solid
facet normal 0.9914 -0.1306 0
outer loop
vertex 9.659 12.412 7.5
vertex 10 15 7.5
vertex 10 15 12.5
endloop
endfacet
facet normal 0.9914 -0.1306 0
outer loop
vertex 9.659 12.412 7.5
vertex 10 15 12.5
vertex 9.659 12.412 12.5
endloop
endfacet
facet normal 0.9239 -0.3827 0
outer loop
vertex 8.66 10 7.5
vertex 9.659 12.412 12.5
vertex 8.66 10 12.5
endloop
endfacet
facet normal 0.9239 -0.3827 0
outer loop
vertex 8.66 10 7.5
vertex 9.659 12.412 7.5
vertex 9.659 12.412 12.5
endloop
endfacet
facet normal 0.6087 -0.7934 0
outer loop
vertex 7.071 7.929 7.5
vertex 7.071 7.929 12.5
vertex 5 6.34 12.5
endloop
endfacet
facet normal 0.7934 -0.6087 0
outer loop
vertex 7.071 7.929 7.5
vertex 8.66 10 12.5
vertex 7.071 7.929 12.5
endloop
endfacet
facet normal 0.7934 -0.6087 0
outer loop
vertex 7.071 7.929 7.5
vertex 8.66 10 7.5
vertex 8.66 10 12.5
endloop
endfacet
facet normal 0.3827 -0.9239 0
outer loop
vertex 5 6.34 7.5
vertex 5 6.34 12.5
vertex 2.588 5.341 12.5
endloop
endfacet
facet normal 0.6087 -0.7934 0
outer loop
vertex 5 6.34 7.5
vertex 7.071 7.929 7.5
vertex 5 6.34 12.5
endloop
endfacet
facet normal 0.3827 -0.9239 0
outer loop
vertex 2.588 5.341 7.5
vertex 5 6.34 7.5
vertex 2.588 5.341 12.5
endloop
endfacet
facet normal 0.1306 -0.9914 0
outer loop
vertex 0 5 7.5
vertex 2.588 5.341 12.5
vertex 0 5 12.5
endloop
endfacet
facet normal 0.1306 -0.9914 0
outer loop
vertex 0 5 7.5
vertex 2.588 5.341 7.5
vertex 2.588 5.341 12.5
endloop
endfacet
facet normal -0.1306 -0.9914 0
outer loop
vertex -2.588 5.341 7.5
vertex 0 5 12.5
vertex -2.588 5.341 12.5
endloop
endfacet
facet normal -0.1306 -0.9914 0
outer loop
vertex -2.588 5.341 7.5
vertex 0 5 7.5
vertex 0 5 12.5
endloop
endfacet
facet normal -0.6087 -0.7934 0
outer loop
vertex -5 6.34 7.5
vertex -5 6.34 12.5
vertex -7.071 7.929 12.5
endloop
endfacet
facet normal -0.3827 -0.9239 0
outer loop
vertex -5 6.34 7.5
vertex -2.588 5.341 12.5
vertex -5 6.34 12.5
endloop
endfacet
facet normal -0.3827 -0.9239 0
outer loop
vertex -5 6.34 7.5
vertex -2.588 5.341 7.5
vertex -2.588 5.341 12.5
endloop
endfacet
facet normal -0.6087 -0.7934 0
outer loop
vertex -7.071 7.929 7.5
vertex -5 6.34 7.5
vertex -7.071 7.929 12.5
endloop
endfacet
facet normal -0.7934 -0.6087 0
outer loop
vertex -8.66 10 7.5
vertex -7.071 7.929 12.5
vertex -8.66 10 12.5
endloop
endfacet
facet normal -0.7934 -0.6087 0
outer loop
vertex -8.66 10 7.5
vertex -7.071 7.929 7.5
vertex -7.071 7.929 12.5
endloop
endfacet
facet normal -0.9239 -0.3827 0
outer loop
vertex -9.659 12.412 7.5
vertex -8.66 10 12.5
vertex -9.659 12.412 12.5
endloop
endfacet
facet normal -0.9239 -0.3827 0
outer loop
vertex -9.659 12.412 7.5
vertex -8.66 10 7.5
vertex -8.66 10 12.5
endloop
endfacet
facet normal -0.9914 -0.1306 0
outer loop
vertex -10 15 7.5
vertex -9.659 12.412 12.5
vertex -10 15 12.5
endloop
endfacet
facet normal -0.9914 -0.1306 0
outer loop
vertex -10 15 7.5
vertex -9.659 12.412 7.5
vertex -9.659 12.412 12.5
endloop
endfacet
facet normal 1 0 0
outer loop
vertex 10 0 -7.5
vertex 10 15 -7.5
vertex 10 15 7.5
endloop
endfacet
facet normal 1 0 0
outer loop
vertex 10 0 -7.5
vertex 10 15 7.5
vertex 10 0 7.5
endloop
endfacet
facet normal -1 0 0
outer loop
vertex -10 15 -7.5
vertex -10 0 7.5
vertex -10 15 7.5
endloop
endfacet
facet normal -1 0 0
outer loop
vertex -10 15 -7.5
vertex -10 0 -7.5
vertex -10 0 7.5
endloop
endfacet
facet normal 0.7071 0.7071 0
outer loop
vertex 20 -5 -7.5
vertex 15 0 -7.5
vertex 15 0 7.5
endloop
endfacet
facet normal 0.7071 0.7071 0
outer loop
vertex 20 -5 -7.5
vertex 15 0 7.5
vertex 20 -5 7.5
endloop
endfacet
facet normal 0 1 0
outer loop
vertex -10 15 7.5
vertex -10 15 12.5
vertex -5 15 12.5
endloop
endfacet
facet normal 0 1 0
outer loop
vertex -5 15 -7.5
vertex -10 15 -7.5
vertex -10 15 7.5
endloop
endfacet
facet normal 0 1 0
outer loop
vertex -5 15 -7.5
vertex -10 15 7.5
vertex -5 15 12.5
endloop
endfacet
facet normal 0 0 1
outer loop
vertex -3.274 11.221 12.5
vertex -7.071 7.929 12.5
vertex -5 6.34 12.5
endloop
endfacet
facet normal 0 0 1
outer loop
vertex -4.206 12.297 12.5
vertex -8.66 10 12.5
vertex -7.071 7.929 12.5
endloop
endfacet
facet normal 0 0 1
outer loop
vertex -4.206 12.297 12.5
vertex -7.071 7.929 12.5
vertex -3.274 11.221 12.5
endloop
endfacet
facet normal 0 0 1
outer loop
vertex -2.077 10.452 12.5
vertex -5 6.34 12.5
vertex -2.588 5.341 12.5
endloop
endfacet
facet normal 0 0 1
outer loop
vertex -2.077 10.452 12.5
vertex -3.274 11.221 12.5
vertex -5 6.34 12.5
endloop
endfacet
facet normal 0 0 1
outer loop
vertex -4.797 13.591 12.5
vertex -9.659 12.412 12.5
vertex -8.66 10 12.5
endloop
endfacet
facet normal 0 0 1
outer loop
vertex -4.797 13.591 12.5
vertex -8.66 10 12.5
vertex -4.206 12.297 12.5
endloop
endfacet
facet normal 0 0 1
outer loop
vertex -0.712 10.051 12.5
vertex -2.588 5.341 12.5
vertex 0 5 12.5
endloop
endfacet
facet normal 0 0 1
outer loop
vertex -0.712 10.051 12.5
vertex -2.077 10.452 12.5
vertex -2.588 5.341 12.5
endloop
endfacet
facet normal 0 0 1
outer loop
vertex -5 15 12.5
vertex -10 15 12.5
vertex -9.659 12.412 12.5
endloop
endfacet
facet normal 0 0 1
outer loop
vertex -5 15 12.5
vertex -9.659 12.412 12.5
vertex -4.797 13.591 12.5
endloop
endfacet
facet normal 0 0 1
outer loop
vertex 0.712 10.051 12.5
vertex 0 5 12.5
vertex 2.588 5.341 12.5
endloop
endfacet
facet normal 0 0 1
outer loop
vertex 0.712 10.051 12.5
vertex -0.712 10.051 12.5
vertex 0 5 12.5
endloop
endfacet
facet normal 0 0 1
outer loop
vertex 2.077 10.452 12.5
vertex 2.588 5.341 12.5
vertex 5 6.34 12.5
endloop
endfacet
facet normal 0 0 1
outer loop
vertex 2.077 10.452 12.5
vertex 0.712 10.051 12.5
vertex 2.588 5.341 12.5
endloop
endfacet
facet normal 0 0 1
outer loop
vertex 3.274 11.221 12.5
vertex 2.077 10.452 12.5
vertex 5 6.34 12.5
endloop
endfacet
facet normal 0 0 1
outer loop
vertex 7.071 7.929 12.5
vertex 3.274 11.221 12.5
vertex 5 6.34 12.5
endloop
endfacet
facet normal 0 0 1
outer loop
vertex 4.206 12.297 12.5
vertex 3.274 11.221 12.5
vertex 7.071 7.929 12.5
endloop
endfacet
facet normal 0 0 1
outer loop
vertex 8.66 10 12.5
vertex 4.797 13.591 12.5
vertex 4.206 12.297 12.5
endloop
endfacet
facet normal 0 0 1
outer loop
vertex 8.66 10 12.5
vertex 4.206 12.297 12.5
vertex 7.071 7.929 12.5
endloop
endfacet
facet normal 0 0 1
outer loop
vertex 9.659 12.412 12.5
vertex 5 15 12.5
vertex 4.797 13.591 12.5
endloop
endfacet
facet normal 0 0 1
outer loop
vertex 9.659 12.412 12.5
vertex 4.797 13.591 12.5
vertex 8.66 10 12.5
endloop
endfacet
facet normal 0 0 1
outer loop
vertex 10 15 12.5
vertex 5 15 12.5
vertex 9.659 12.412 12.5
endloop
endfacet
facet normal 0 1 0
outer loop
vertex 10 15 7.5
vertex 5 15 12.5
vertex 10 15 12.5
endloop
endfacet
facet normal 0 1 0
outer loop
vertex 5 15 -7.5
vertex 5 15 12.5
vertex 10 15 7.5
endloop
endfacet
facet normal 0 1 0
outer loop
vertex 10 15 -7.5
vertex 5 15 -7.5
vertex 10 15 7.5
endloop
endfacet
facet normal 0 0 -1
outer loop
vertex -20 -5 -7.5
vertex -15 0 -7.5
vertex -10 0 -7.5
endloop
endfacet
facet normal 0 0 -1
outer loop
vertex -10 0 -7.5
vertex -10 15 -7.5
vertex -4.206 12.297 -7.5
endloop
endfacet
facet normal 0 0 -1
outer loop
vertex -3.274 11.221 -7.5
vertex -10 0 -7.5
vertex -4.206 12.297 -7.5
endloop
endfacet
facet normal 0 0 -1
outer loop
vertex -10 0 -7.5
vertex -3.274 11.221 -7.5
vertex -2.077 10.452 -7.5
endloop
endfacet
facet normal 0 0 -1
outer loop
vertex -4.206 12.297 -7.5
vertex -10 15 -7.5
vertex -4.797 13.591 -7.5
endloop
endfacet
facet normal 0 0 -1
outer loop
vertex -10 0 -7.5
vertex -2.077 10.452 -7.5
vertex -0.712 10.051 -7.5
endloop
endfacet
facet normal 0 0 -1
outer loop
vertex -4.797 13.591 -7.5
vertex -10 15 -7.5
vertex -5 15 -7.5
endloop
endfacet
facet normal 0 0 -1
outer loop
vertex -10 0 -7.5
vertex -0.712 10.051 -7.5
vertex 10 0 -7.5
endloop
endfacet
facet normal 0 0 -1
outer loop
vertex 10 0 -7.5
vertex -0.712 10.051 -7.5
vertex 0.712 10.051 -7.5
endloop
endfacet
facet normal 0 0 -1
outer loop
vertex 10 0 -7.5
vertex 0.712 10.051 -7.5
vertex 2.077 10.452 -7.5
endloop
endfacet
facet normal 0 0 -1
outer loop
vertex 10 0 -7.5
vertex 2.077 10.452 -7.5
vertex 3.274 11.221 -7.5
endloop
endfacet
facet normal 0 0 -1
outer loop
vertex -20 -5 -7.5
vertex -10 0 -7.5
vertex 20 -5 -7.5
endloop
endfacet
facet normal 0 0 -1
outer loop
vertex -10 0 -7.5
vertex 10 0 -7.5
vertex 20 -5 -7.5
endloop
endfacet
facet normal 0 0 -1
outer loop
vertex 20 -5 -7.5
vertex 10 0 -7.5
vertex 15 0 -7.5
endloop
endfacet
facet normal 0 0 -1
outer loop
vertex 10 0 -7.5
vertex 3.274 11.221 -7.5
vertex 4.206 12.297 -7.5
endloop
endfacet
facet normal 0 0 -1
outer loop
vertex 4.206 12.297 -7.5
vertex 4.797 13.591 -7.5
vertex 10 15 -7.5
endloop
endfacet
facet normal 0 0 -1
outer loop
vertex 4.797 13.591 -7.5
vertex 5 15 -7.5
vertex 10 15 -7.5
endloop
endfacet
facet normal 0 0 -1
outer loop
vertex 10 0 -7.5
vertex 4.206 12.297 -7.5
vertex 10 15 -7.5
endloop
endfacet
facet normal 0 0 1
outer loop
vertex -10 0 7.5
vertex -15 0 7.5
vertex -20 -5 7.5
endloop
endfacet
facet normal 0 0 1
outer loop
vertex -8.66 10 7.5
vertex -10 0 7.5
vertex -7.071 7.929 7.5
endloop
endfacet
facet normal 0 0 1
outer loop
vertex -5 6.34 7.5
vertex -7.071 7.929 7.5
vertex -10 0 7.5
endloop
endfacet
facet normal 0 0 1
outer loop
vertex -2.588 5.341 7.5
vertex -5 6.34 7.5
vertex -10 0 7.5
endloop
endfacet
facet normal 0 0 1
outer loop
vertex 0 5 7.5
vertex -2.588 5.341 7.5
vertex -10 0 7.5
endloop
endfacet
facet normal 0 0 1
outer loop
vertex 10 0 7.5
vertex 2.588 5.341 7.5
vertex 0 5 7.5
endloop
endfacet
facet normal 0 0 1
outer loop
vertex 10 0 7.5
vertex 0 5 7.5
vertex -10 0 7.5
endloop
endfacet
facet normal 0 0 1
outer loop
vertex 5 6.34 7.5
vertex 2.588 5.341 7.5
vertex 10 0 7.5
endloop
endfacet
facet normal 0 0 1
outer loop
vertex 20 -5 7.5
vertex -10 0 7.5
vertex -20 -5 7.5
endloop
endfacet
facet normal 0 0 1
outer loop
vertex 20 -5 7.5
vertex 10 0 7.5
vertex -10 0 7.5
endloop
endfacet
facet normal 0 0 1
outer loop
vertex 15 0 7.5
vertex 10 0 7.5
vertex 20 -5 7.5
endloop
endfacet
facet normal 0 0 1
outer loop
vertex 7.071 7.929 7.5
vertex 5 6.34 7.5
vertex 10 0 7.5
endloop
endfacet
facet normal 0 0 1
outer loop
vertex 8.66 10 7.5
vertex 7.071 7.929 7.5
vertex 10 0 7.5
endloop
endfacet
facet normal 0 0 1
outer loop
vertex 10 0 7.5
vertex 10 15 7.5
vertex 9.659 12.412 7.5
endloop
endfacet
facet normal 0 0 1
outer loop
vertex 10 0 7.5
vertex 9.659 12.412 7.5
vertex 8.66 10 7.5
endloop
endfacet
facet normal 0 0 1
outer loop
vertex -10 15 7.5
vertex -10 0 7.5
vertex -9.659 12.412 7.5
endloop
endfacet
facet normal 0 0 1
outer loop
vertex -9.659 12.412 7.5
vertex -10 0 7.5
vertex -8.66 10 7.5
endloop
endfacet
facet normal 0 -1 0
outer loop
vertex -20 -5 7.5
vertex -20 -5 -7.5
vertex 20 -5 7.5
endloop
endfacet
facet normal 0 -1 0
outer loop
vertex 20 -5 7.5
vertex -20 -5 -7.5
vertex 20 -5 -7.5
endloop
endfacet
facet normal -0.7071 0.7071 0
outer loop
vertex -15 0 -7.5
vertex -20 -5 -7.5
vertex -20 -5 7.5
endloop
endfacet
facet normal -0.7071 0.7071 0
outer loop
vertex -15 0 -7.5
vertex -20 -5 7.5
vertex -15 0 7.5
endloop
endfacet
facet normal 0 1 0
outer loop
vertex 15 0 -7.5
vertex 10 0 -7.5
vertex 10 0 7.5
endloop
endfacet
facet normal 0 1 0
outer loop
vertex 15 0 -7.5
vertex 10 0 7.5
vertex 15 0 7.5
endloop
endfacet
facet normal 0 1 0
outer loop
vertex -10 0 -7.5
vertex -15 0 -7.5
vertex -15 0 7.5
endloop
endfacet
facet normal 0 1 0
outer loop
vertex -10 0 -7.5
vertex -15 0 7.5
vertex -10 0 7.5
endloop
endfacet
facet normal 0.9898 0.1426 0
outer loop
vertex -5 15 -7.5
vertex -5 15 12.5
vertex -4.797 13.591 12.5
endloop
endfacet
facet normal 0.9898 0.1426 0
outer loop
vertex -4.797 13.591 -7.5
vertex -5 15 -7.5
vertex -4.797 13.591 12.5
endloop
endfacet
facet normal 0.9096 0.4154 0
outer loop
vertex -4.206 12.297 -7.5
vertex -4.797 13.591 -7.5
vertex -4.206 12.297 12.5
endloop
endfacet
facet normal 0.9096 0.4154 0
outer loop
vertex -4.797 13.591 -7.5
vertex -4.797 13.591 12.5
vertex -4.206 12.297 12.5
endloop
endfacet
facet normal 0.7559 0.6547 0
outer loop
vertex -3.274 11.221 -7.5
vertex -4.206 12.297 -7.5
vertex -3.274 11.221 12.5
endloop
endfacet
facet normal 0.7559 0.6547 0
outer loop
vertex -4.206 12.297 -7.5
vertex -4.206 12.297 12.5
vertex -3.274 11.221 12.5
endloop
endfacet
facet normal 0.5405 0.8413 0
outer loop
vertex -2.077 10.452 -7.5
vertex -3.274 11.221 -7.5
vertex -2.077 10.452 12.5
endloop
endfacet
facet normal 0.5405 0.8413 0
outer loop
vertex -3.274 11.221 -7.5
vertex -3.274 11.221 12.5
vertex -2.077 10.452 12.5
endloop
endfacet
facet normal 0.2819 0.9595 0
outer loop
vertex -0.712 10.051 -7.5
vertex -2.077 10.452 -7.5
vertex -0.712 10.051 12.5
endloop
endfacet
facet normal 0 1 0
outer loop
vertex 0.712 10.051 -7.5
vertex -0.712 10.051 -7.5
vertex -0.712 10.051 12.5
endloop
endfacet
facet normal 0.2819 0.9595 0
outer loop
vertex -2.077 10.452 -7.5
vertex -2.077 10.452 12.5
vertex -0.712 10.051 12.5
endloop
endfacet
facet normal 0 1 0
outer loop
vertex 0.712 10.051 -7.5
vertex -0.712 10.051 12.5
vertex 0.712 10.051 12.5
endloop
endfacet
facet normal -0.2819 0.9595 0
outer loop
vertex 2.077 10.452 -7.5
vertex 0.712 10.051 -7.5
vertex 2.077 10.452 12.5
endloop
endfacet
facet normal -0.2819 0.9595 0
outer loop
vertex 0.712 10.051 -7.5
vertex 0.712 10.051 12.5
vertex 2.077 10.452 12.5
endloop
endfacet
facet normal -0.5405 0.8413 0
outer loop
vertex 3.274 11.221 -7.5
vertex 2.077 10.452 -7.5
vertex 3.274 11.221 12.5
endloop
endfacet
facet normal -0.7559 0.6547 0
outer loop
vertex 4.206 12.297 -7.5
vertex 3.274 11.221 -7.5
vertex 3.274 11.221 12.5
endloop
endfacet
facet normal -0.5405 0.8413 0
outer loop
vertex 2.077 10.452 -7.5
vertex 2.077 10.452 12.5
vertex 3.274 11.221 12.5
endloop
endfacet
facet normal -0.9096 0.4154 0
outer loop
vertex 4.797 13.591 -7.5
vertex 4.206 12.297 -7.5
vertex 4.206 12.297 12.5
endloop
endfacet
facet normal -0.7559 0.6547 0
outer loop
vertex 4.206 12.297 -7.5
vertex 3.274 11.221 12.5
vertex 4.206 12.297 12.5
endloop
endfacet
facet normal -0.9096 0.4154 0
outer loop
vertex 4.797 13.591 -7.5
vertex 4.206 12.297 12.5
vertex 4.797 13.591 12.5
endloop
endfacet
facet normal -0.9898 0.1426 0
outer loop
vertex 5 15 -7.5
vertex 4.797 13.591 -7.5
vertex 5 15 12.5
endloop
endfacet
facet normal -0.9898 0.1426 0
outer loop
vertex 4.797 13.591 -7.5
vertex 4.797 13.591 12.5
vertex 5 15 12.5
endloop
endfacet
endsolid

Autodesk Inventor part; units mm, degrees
ref_plane "YZ Plane" through (0, 0, 0) normal (1, 0, 0) x (0, 1, 0)
ref_plane "XZ Plane" through (0, 0, 0) normal (0, 1, 0) x (-1, 0, 0)
ref_plane "XY Plane" through (0, 0, 0) normal (0, 0, 1) x (1, 0, 0)
sketch "草圖1" plane through (0, 0, 0) normal (0, 0, 1) x (1, 0, 0)
  line L0 (-20, -5) -> (0, -5)
  line L1 (-20, -5) -> (-15, 0)
  line L2 (-15, 0) -> (-10, 0)
  line L3 (-10, 0) -> (-10, 15)
  line L4 (-10, 15) -> (0, 15)
  line L5 (0, -5) -> (0, 15)
  point P0 (0, 0)
  dimension "d0" = 20
  dimension "d1" = 5
  dimension "d2" = 5
  dimension "d3" = 20
  dimension "d4" = 10
extrude "擠出1" add sketch "草圖1" along normal mid plane 15
mirror "鏡射1" about plane through (0, -5, 0) normal (1, 0, 0) of "擠出1"
sketch "草圖2" plane through (0, 0, 7.5) normal (0, 0, 1) x (1, 0, 0)
  line L0 (-20, -5) -> (20, -5) construction
  line L1 (15, 0) -> (20, -5) construction
  line L2 (10, 0) -> (15, 0) construction
  line L3 (10, 15) -> (10, 0) construction
  line L4 (-10, 15) -> (10, 15) construction
  line L5 (-10, 15) -> (-10, 0) construction
  line L6 (-10, 0) -> (-15, 0) construction
  line L7 (-15, 0) -> (-20, -5) construction
  line L8 (-10, 15) -> (10, 15) projected
  arc A0 (-10, 15) -> (10, 15) centre (0, 15) ccw
  arc A1 (-5, 15) -> (5, 15) centre (0, 15) ccw
  point P0 (0, 0)
  dimension "d7" = 10
extrude "擠出2" add sketch "草圖2" along normal blind 5 contours L8 A1 A0
sketch "草圖3" plane through (0, 0, 7.5) normal (0, 0, 1) x (1, 0, 0)
  arc A0 (-5, 15) -> (5, 15) centre (0, 15) ccw projected
  line L0 (-5, 15) -> (5, 15) projected
  point P0 (0, 0)
extrude "擠出3" cut sketch "草圖3" against normal through all
properties part number "1"
